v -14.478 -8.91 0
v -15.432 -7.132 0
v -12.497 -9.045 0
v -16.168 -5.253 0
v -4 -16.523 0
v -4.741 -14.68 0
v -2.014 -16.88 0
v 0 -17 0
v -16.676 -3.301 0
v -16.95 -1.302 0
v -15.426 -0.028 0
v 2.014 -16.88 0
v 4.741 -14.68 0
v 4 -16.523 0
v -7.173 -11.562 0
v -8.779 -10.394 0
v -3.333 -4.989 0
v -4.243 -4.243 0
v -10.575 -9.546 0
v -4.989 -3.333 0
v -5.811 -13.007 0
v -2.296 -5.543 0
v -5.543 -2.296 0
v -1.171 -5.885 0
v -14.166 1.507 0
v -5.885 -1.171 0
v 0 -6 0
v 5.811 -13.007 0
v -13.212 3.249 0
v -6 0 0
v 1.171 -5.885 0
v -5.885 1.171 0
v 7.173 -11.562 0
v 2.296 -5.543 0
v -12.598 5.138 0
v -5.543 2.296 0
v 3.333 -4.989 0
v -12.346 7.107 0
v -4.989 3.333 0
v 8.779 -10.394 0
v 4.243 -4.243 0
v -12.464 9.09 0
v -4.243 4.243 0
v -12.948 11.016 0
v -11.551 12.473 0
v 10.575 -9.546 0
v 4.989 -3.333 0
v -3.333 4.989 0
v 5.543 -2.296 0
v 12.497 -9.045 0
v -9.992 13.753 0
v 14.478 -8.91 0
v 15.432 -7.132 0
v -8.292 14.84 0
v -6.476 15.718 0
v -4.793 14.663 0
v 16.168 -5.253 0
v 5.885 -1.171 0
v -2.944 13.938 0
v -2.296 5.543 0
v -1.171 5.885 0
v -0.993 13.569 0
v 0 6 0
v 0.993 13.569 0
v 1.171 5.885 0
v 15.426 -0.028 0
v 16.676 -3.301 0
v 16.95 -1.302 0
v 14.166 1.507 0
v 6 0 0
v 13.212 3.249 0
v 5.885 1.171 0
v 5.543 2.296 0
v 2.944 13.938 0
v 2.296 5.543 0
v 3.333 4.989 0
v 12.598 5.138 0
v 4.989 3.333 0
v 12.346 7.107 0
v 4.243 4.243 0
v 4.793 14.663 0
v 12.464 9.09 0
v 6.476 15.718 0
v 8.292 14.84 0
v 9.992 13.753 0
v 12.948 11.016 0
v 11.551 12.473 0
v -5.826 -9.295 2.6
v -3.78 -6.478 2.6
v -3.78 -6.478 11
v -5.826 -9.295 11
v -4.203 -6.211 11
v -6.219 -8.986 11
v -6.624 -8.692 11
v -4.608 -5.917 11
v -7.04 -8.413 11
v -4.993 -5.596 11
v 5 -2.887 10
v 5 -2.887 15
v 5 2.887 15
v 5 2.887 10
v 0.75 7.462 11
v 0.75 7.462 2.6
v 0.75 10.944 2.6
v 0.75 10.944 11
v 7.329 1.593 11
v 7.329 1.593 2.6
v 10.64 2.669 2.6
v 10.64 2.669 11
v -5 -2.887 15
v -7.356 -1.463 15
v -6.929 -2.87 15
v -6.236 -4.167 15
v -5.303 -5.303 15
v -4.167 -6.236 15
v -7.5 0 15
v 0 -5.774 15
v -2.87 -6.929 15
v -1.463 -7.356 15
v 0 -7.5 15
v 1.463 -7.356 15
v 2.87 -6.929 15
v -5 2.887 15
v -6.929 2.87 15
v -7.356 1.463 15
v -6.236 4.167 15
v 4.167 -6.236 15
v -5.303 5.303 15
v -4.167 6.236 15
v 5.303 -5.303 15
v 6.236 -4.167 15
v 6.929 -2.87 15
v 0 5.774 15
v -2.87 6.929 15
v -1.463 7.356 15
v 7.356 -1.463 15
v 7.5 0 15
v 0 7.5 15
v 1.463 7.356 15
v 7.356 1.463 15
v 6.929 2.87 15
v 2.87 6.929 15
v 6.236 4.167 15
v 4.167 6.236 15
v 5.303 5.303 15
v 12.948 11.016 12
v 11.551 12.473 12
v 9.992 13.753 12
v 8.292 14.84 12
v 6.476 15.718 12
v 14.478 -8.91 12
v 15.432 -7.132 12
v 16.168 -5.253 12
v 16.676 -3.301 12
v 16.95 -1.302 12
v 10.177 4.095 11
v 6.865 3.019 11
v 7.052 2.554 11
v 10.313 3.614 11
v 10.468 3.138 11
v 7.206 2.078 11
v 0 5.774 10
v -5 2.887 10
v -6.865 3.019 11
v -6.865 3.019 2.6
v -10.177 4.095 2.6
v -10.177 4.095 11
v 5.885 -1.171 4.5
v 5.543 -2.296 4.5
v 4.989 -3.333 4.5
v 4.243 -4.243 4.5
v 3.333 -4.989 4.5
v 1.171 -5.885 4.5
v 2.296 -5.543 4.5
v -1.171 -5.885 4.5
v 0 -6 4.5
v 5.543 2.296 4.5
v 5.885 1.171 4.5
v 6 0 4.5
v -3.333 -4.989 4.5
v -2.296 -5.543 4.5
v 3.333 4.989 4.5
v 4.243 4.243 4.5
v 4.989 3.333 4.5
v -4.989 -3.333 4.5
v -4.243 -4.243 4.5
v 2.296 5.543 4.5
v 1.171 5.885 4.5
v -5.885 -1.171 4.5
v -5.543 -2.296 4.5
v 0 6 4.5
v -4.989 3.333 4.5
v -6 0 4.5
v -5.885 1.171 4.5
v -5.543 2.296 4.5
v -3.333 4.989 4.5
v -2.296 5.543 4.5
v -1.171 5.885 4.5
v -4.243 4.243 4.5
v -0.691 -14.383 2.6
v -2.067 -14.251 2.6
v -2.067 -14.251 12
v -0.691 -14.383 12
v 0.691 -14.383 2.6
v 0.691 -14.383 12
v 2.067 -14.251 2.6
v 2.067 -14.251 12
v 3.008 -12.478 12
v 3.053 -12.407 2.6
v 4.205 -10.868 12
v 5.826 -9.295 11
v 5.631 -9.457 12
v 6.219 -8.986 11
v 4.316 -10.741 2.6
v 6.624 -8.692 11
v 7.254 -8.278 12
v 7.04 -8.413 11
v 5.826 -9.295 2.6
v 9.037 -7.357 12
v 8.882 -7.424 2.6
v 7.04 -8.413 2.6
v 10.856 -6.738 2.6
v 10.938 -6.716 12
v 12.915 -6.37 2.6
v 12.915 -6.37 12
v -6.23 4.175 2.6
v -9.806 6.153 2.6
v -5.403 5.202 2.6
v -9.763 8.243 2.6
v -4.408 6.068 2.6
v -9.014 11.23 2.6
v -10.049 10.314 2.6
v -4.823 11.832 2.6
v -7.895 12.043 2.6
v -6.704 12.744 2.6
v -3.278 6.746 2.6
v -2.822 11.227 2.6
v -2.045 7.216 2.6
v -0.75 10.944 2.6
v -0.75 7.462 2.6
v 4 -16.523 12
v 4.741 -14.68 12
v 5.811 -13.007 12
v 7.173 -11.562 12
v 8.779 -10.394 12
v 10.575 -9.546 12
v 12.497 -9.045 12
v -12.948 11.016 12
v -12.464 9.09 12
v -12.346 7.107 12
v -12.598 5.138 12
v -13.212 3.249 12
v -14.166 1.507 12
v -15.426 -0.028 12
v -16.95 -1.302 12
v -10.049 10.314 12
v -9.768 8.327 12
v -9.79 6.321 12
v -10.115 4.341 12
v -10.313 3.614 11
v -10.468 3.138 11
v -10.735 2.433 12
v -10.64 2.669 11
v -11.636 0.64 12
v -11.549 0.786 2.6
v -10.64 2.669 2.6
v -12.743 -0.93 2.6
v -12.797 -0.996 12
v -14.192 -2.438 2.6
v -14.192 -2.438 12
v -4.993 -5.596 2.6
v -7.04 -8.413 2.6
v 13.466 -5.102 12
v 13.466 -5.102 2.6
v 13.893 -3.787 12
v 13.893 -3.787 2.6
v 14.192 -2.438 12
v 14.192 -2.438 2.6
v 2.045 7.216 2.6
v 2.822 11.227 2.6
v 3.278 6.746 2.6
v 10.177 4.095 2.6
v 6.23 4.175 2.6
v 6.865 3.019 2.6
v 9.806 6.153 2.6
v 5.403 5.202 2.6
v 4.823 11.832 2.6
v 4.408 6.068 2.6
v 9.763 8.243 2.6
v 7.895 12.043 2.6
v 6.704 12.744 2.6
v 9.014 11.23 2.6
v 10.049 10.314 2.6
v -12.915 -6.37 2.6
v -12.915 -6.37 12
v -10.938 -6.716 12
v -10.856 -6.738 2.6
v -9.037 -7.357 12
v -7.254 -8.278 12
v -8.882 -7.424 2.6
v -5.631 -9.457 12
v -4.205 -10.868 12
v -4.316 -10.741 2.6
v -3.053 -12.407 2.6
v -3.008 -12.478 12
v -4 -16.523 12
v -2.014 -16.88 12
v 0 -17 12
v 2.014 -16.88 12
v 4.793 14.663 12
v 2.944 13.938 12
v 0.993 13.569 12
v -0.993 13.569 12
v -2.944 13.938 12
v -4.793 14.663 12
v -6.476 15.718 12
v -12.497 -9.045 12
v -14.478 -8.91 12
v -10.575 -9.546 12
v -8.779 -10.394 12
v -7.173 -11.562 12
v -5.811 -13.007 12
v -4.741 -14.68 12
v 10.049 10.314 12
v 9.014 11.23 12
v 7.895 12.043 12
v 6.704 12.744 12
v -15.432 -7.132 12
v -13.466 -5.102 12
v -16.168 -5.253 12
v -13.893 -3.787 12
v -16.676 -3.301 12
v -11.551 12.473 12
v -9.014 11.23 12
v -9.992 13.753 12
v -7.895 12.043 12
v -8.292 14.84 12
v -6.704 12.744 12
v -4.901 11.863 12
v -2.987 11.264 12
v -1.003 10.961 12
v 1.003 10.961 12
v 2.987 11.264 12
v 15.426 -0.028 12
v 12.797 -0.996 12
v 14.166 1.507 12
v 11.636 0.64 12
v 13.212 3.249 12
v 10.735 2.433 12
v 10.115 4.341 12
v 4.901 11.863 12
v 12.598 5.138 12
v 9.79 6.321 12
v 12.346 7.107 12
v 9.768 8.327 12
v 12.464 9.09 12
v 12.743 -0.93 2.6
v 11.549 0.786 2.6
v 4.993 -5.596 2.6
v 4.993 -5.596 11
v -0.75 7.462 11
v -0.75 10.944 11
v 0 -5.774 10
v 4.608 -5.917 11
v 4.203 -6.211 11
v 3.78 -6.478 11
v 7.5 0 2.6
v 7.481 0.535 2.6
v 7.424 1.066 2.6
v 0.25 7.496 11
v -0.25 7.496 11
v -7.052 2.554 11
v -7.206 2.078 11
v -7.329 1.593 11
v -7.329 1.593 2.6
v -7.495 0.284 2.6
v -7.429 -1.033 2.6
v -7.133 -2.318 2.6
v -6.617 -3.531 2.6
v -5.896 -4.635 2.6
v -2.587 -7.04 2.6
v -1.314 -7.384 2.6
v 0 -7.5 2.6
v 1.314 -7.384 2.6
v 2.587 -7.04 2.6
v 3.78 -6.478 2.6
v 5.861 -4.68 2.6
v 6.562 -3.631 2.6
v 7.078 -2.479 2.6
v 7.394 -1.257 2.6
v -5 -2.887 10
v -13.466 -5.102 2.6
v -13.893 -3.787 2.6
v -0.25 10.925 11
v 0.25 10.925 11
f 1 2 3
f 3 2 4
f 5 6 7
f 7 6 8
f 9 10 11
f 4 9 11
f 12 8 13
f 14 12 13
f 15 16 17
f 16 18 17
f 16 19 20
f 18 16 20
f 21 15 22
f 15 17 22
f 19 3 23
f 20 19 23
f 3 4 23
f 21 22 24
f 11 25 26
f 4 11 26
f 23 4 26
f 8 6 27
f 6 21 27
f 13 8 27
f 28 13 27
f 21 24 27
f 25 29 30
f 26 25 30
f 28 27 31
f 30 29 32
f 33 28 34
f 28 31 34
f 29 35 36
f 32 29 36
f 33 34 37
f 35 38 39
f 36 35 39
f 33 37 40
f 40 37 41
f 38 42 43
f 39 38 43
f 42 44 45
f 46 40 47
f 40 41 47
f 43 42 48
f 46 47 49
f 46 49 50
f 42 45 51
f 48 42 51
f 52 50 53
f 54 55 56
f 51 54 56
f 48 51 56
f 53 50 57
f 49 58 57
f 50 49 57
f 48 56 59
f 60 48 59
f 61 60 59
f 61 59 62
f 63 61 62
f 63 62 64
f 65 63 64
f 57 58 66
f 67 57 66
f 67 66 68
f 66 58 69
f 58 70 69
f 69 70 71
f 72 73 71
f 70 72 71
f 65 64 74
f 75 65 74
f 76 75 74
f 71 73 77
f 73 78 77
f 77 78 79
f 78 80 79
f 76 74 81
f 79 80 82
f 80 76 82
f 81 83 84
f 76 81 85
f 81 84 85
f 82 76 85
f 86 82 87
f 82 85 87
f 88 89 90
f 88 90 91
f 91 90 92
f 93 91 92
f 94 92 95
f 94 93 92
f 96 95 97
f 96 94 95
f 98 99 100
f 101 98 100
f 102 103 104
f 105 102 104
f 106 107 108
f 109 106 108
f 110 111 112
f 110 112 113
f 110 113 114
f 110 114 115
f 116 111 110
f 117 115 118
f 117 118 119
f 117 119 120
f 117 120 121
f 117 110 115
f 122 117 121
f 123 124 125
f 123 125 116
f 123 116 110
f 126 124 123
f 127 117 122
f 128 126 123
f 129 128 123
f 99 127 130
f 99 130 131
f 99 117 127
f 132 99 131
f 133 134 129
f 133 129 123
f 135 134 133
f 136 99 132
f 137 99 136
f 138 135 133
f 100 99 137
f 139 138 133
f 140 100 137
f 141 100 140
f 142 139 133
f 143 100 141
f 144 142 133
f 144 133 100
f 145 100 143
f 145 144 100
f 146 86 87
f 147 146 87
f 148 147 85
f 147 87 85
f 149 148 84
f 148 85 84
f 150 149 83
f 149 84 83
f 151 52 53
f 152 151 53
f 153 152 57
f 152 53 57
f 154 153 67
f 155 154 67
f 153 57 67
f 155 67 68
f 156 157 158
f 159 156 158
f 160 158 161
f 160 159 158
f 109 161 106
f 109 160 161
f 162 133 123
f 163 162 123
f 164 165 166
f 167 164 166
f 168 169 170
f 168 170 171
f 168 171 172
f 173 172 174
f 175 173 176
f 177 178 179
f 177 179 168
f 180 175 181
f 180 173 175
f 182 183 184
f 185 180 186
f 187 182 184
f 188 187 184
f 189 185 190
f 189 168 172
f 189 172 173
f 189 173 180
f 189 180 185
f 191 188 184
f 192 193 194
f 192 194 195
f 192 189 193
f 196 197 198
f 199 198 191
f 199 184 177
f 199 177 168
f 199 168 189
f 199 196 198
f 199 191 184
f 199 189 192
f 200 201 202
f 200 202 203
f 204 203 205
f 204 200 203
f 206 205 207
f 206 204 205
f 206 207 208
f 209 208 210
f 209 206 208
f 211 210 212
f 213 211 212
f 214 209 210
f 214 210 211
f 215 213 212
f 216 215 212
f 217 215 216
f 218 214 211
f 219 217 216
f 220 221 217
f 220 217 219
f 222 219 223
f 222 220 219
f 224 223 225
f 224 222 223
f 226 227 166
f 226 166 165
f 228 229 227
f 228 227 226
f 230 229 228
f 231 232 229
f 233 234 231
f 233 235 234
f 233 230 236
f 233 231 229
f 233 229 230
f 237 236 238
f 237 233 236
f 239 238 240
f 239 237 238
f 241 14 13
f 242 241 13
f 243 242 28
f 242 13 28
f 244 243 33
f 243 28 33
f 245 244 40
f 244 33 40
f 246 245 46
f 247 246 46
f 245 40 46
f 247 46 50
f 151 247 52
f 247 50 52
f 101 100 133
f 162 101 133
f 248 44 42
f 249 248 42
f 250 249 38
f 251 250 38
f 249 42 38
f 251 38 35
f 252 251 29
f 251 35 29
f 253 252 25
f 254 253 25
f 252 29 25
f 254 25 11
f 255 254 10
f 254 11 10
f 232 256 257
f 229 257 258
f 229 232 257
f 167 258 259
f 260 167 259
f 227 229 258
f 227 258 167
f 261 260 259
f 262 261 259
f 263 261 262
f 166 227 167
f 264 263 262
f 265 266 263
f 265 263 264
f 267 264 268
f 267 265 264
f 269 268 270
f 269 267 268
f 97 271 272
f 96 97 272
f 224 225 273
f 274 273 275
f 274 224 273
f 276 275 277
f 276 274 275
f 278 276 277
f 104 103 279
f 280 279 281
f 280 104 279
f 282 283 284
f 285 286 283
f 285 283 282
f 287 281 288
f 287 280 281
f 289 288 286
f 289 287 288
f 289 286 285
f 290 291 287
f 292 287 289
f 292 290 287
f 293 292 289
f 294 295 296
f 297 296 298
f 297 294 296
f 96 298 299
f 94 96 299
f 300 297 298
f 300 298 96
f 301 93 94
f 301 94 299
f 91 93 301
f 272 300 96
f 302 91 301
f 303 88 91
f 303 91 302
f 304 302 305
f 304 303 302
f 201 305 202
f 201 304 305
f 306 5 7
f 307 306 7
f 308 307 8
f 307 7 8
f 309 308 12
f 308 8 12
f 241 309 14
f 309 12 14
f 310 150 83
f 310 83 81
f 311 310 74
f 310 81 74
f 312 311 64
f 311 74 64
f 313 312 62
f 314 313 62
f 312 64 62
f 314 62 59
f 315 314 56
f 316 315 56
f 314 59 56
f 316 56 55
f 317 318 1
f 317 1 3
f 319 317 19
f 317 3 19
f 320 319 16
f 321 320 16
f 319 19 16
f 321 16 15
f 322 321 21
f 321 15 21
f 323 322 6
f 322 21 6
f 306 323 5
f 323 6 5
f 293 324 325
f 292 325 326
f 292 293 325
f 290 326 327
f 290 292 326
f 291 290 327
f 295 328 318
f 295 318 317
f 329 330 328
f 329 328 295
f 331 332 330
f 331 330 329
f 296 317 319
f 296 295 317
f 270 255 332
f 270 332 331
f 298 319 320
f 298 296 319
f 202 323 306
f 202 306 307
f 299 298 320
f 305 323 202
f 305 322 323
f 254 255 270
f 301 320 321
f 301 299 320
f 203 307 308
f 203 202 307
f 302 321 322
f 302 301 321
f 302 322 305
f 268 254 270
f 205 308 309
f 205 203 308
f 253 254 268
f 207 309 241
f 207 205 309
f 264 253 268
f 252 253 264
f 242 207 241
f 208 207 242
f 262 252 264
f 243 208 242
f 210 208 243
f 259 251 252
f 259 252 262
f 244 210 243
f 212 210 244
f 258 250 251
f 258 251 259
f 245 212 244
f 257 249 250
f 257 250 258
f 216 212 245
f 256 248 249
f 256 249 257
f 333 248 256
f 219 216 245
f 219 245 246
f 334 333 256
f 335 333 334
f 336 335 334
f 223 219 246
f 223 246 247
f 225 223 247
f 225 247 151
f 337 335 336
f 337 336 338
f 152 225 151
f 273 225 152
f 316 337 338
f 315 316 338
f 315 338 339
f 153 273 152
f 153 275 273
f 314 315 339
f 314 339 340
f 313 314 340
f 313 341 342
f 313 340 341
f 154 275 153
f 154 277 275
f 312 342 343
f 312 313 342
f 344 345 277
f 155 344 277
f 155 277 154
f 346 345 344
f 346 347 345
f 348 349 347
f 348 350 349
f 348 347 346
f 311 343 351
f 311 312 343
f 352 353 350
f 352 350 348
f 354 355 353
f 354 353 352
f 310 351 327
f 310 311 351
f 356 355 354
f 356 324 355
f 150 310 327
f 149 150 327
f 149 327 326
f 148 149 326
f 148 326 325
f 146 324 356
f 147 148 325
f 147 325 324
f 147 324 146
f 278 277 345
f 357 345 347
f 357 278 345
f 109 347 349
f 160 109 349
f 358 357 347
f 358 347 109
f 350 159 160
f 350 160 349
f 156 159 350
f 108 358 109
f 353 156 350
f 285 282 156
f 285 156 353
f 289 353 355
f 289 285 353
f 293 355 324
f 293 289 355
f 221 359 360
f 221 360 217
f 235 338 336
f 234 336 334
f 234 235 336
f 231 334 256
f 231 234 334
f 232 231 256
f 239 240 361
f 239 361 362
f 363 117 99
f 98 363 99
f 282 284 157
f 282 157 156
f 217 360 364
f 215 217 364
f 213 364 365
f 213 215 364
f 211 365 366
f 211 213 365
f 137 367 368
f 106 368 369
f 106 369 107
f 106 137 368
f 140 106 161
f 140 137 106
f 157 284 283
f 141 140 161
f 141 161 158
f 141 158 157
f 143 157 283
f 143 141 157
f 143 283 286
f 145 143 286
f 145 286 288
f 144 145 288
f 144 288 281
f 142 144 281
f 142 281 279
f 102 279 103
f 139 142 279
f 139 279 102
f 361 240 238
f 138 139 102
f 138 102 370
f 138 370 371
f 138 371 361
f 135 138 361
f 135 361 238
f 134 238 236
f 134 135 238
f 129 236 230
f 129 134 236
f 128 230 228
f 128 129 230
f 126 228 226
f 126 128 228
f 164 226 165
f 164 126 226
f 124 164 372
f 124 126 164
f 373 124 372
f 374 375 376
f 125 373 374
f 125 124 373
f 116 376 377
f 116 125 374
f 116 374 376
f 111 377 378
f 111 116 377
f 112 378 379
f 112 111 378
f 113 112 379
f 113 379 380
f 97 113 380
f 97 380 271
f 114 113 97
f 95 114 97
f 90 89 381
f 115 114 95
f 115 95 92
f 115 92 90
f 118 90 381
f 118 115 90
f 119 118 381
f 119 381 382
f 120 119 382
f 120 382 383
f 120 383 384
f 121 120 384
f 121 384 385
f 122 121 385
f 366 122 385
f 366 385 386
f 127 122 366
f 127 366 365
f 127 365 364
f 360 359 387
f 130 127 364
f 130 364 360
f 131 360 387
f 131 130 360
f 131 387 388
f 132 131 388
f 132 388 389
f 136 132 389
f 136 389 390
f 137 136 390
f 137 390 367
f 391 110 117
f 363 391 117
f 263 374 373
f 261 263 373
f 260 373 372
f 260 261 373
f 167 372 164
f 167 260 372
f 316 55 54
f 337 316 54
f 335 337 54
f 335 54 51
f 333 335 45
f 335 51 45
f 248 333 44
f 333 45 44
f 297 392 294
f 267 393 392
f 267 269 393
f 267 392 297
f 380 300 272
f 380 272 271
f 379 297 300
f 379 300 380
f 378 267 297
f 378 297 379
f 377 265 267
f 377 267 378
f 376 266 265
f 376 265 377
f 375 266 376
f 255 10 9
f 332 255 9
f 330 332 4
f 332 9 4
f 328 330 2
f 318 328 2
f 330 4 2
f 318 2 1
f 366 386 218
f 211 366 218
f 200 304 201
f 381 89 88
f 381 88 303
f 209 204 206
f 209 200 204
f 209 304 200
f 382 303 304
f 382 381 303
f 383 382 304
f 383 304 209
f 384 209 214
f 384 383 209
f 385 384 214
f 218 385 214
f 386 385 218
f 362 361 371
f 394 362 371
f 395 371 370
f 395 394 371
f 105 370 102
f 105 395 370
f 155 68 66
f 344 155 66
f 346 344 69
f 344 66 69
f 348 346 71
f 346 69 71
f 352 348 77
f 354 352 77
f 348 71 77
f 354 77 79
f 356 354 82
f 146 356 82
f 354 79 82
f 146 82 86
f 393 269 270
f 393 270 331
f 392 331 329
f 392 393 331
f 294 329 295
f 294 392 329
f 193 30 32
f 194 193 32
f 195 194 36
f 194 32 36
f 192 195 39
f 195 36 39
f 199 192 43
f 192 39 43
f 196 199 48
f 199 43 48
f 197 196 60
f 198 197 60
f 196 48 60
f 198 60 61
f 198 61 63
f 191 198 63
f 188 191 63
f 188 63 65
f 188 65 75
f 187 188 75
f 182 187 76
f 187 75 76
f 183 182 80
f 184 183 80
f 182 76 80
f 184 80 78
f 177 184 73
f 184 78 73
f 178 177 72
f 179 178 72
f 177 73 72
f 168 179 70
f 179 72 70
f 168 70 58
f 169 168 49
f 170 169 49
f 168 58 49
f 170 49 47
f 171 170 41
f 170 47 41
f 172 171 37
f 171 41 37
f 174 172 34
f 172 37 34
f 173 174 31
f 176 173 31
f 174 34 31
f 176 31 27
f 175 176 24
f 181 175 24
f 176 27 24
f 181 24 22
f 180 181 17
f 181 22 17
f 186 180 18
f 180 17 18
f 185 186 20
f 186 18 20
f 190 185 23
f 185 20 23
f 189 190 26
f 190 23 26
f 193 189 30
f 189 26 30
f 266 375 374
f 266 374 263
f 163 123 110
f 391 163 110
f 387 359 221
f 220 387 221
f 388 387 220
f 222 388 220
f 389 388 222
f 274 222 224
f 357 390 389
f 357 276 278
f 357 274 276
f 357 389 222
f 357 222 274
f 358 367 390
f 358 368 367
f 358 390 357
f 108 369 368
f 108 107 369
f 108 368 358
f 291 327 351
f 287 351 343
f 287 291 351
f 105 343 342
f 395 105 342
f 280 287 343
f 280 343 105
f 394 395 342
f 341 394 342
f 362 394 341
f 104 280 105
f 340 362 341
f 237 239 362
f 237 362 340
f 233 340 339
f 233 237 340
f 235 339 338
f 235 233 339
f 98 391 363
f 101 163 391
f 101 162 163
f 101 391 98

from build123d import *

# Parameters (mm, degrees)
BOSS_EXTRU_1_DEPTH           = 12
COQUE1_T                     = -2.6
ESQUISSE4_R                  = 7.5
BOSS_EXTRU_2_DEPTH           = 12.4
NERVURE1_REACH               = 28.407
ESQUISSE6_WALLS_W            = 1.5
ESQUISSE6_WALLS_H            = 61.384627196
R_P_TITION_CIRCULAIRE1_COUNT = 5
ESQUISSE7_R                  = 6
ENL_V_MAT_EXTRU_1_DEPTH      = 4.5
ENL_V_MAT_EXTRU_2_DEPTH      = 5


with BuildPart() as part:
    # Esquisse1 → Boss.-Extru.1 (new body)
    with BuildSketch(Plane.XY):
        with BuildLine():
            ThreePointArc((-6.475738253, 15.718295521), (-9.992349289, 13.753288904), (-12.947874208, 11.016013502))
            ThreePointArc((-12.947874208, 11.016013502), (-12.861203675, 4.178858391), (-16.950100551, -1.301572625))
            ThreePointArc((-16.950100551, -1.301572625), (-16.167960777, -5.253288904), (-14.477964596, -8.910024756))
            ThreePointArc((-14.477964596, -8.910024756), (-7.948661008, -10.940393303), (-4, -16.522711642))
            ThreePointArc((-4, -16.522711642), (0, -17), (4, -16.522711642))
            ThreePointArc((4, -16.522711642), (7.948661008, -10.940393303), (14.477964596, -8.910024756))
            ThreePointArc((14.477964596, -8.910024756), (16.167960777, -5.253288904), (16.950100551, -1.301572625))
            ThreePointArc((16.950100551, -1.301572625), (12.861203675, 4.178858391), (12.947874208, 11.016013502))
            ThreePointArc((12.947874208, 11.016013502), (9.992349289, 13.753288904), (6.475738253, 15.718295521))
            ThreePointArc((6.475738253, 15.718295521), (0, 13.523069823), (-6.475738253, 15.718295521))
        make_face()
    extrude(amount=BOSS_EXTRU_1_DEPTH)

    # Coque1
    coque1_openings = [part.faces().sort_by_distance(p)[0] for p in [
        (0, 0, 12),
    ]]
    offset(amount=COQUE1_T, openings=coque1_openings, kind=Kind.INTERSECTION)

    # Esquisse4 → Boss.-Extru.2 (add)
    with BuildSketch(Plane.XY.offset(15)):
        Circle(ESQUISSE4_R)
    extrude(amount=-BOSS_EXTRU_2_DEPTH)

    # Esquisse6 walls → Nervure1 (add, up to next)
    with BuildSketch(Plane.XY.offset(11), mode=Mode.PRIVATE) as nervure1_sk1:
        with Locations((0, 9.152971246)):
            Rectangle(ESQUISSE6_WALLS_W, ESQUISSE6_WALLS_H)
    nervure1_tool1 = extrude(nervure1_sk1.sketch, amount=-NERVURE1_REACH, mode=Mode.PRIVATE) - part.part
    nervure1 = nervure1_tool1.solids().sort_by_distance((0, 9.152971246, 11))[0]
    add(nervure1)

    # Répétition circulaire1: Nervure1 ×5 about axis
    r_p_tition_circulaire1_axis = Axis((0, 0, 0), (0, 0, 1))
    for i in range(1, R_P_TITION_CIRCULAIRE1_COUNT):
        add(nervure1.rotate(r_p_tition_circulaire1_axis, i * 360 / R_P_TITION_CIRCULAIRE1_COUNT))

    # Esquisse7 → Enlèv. mat.-Extru.1 (cut)
    with BuildSketch(Plane(origin=(0, 0, 0), x_dir=(-1, 0, 0), z_dir=(0, 0, -1))):
        Circle(ESQUISSE7_R)
    extrude(amount=-ENL_V_MAT_EXTRU_1_DEPTH, mode=Mode.SUBTRACT)

    # Esquisse8 → Enlèv. mat.-Extru.2 (cut)
    with BuildSketch(Plane.XY.offset(15)):
        Polygon((-5, 2.886751346), (-5, -2.886751346), (0, -5.773502692), (5, -2.886751346), (5, 2.886751346), (0, 5.773502692), align=None)
    extrude(amount=-ENL_V_MAT_EXTRU_2_DEPTH, mode=Mode.SUBTRACT)


solid = part.part
